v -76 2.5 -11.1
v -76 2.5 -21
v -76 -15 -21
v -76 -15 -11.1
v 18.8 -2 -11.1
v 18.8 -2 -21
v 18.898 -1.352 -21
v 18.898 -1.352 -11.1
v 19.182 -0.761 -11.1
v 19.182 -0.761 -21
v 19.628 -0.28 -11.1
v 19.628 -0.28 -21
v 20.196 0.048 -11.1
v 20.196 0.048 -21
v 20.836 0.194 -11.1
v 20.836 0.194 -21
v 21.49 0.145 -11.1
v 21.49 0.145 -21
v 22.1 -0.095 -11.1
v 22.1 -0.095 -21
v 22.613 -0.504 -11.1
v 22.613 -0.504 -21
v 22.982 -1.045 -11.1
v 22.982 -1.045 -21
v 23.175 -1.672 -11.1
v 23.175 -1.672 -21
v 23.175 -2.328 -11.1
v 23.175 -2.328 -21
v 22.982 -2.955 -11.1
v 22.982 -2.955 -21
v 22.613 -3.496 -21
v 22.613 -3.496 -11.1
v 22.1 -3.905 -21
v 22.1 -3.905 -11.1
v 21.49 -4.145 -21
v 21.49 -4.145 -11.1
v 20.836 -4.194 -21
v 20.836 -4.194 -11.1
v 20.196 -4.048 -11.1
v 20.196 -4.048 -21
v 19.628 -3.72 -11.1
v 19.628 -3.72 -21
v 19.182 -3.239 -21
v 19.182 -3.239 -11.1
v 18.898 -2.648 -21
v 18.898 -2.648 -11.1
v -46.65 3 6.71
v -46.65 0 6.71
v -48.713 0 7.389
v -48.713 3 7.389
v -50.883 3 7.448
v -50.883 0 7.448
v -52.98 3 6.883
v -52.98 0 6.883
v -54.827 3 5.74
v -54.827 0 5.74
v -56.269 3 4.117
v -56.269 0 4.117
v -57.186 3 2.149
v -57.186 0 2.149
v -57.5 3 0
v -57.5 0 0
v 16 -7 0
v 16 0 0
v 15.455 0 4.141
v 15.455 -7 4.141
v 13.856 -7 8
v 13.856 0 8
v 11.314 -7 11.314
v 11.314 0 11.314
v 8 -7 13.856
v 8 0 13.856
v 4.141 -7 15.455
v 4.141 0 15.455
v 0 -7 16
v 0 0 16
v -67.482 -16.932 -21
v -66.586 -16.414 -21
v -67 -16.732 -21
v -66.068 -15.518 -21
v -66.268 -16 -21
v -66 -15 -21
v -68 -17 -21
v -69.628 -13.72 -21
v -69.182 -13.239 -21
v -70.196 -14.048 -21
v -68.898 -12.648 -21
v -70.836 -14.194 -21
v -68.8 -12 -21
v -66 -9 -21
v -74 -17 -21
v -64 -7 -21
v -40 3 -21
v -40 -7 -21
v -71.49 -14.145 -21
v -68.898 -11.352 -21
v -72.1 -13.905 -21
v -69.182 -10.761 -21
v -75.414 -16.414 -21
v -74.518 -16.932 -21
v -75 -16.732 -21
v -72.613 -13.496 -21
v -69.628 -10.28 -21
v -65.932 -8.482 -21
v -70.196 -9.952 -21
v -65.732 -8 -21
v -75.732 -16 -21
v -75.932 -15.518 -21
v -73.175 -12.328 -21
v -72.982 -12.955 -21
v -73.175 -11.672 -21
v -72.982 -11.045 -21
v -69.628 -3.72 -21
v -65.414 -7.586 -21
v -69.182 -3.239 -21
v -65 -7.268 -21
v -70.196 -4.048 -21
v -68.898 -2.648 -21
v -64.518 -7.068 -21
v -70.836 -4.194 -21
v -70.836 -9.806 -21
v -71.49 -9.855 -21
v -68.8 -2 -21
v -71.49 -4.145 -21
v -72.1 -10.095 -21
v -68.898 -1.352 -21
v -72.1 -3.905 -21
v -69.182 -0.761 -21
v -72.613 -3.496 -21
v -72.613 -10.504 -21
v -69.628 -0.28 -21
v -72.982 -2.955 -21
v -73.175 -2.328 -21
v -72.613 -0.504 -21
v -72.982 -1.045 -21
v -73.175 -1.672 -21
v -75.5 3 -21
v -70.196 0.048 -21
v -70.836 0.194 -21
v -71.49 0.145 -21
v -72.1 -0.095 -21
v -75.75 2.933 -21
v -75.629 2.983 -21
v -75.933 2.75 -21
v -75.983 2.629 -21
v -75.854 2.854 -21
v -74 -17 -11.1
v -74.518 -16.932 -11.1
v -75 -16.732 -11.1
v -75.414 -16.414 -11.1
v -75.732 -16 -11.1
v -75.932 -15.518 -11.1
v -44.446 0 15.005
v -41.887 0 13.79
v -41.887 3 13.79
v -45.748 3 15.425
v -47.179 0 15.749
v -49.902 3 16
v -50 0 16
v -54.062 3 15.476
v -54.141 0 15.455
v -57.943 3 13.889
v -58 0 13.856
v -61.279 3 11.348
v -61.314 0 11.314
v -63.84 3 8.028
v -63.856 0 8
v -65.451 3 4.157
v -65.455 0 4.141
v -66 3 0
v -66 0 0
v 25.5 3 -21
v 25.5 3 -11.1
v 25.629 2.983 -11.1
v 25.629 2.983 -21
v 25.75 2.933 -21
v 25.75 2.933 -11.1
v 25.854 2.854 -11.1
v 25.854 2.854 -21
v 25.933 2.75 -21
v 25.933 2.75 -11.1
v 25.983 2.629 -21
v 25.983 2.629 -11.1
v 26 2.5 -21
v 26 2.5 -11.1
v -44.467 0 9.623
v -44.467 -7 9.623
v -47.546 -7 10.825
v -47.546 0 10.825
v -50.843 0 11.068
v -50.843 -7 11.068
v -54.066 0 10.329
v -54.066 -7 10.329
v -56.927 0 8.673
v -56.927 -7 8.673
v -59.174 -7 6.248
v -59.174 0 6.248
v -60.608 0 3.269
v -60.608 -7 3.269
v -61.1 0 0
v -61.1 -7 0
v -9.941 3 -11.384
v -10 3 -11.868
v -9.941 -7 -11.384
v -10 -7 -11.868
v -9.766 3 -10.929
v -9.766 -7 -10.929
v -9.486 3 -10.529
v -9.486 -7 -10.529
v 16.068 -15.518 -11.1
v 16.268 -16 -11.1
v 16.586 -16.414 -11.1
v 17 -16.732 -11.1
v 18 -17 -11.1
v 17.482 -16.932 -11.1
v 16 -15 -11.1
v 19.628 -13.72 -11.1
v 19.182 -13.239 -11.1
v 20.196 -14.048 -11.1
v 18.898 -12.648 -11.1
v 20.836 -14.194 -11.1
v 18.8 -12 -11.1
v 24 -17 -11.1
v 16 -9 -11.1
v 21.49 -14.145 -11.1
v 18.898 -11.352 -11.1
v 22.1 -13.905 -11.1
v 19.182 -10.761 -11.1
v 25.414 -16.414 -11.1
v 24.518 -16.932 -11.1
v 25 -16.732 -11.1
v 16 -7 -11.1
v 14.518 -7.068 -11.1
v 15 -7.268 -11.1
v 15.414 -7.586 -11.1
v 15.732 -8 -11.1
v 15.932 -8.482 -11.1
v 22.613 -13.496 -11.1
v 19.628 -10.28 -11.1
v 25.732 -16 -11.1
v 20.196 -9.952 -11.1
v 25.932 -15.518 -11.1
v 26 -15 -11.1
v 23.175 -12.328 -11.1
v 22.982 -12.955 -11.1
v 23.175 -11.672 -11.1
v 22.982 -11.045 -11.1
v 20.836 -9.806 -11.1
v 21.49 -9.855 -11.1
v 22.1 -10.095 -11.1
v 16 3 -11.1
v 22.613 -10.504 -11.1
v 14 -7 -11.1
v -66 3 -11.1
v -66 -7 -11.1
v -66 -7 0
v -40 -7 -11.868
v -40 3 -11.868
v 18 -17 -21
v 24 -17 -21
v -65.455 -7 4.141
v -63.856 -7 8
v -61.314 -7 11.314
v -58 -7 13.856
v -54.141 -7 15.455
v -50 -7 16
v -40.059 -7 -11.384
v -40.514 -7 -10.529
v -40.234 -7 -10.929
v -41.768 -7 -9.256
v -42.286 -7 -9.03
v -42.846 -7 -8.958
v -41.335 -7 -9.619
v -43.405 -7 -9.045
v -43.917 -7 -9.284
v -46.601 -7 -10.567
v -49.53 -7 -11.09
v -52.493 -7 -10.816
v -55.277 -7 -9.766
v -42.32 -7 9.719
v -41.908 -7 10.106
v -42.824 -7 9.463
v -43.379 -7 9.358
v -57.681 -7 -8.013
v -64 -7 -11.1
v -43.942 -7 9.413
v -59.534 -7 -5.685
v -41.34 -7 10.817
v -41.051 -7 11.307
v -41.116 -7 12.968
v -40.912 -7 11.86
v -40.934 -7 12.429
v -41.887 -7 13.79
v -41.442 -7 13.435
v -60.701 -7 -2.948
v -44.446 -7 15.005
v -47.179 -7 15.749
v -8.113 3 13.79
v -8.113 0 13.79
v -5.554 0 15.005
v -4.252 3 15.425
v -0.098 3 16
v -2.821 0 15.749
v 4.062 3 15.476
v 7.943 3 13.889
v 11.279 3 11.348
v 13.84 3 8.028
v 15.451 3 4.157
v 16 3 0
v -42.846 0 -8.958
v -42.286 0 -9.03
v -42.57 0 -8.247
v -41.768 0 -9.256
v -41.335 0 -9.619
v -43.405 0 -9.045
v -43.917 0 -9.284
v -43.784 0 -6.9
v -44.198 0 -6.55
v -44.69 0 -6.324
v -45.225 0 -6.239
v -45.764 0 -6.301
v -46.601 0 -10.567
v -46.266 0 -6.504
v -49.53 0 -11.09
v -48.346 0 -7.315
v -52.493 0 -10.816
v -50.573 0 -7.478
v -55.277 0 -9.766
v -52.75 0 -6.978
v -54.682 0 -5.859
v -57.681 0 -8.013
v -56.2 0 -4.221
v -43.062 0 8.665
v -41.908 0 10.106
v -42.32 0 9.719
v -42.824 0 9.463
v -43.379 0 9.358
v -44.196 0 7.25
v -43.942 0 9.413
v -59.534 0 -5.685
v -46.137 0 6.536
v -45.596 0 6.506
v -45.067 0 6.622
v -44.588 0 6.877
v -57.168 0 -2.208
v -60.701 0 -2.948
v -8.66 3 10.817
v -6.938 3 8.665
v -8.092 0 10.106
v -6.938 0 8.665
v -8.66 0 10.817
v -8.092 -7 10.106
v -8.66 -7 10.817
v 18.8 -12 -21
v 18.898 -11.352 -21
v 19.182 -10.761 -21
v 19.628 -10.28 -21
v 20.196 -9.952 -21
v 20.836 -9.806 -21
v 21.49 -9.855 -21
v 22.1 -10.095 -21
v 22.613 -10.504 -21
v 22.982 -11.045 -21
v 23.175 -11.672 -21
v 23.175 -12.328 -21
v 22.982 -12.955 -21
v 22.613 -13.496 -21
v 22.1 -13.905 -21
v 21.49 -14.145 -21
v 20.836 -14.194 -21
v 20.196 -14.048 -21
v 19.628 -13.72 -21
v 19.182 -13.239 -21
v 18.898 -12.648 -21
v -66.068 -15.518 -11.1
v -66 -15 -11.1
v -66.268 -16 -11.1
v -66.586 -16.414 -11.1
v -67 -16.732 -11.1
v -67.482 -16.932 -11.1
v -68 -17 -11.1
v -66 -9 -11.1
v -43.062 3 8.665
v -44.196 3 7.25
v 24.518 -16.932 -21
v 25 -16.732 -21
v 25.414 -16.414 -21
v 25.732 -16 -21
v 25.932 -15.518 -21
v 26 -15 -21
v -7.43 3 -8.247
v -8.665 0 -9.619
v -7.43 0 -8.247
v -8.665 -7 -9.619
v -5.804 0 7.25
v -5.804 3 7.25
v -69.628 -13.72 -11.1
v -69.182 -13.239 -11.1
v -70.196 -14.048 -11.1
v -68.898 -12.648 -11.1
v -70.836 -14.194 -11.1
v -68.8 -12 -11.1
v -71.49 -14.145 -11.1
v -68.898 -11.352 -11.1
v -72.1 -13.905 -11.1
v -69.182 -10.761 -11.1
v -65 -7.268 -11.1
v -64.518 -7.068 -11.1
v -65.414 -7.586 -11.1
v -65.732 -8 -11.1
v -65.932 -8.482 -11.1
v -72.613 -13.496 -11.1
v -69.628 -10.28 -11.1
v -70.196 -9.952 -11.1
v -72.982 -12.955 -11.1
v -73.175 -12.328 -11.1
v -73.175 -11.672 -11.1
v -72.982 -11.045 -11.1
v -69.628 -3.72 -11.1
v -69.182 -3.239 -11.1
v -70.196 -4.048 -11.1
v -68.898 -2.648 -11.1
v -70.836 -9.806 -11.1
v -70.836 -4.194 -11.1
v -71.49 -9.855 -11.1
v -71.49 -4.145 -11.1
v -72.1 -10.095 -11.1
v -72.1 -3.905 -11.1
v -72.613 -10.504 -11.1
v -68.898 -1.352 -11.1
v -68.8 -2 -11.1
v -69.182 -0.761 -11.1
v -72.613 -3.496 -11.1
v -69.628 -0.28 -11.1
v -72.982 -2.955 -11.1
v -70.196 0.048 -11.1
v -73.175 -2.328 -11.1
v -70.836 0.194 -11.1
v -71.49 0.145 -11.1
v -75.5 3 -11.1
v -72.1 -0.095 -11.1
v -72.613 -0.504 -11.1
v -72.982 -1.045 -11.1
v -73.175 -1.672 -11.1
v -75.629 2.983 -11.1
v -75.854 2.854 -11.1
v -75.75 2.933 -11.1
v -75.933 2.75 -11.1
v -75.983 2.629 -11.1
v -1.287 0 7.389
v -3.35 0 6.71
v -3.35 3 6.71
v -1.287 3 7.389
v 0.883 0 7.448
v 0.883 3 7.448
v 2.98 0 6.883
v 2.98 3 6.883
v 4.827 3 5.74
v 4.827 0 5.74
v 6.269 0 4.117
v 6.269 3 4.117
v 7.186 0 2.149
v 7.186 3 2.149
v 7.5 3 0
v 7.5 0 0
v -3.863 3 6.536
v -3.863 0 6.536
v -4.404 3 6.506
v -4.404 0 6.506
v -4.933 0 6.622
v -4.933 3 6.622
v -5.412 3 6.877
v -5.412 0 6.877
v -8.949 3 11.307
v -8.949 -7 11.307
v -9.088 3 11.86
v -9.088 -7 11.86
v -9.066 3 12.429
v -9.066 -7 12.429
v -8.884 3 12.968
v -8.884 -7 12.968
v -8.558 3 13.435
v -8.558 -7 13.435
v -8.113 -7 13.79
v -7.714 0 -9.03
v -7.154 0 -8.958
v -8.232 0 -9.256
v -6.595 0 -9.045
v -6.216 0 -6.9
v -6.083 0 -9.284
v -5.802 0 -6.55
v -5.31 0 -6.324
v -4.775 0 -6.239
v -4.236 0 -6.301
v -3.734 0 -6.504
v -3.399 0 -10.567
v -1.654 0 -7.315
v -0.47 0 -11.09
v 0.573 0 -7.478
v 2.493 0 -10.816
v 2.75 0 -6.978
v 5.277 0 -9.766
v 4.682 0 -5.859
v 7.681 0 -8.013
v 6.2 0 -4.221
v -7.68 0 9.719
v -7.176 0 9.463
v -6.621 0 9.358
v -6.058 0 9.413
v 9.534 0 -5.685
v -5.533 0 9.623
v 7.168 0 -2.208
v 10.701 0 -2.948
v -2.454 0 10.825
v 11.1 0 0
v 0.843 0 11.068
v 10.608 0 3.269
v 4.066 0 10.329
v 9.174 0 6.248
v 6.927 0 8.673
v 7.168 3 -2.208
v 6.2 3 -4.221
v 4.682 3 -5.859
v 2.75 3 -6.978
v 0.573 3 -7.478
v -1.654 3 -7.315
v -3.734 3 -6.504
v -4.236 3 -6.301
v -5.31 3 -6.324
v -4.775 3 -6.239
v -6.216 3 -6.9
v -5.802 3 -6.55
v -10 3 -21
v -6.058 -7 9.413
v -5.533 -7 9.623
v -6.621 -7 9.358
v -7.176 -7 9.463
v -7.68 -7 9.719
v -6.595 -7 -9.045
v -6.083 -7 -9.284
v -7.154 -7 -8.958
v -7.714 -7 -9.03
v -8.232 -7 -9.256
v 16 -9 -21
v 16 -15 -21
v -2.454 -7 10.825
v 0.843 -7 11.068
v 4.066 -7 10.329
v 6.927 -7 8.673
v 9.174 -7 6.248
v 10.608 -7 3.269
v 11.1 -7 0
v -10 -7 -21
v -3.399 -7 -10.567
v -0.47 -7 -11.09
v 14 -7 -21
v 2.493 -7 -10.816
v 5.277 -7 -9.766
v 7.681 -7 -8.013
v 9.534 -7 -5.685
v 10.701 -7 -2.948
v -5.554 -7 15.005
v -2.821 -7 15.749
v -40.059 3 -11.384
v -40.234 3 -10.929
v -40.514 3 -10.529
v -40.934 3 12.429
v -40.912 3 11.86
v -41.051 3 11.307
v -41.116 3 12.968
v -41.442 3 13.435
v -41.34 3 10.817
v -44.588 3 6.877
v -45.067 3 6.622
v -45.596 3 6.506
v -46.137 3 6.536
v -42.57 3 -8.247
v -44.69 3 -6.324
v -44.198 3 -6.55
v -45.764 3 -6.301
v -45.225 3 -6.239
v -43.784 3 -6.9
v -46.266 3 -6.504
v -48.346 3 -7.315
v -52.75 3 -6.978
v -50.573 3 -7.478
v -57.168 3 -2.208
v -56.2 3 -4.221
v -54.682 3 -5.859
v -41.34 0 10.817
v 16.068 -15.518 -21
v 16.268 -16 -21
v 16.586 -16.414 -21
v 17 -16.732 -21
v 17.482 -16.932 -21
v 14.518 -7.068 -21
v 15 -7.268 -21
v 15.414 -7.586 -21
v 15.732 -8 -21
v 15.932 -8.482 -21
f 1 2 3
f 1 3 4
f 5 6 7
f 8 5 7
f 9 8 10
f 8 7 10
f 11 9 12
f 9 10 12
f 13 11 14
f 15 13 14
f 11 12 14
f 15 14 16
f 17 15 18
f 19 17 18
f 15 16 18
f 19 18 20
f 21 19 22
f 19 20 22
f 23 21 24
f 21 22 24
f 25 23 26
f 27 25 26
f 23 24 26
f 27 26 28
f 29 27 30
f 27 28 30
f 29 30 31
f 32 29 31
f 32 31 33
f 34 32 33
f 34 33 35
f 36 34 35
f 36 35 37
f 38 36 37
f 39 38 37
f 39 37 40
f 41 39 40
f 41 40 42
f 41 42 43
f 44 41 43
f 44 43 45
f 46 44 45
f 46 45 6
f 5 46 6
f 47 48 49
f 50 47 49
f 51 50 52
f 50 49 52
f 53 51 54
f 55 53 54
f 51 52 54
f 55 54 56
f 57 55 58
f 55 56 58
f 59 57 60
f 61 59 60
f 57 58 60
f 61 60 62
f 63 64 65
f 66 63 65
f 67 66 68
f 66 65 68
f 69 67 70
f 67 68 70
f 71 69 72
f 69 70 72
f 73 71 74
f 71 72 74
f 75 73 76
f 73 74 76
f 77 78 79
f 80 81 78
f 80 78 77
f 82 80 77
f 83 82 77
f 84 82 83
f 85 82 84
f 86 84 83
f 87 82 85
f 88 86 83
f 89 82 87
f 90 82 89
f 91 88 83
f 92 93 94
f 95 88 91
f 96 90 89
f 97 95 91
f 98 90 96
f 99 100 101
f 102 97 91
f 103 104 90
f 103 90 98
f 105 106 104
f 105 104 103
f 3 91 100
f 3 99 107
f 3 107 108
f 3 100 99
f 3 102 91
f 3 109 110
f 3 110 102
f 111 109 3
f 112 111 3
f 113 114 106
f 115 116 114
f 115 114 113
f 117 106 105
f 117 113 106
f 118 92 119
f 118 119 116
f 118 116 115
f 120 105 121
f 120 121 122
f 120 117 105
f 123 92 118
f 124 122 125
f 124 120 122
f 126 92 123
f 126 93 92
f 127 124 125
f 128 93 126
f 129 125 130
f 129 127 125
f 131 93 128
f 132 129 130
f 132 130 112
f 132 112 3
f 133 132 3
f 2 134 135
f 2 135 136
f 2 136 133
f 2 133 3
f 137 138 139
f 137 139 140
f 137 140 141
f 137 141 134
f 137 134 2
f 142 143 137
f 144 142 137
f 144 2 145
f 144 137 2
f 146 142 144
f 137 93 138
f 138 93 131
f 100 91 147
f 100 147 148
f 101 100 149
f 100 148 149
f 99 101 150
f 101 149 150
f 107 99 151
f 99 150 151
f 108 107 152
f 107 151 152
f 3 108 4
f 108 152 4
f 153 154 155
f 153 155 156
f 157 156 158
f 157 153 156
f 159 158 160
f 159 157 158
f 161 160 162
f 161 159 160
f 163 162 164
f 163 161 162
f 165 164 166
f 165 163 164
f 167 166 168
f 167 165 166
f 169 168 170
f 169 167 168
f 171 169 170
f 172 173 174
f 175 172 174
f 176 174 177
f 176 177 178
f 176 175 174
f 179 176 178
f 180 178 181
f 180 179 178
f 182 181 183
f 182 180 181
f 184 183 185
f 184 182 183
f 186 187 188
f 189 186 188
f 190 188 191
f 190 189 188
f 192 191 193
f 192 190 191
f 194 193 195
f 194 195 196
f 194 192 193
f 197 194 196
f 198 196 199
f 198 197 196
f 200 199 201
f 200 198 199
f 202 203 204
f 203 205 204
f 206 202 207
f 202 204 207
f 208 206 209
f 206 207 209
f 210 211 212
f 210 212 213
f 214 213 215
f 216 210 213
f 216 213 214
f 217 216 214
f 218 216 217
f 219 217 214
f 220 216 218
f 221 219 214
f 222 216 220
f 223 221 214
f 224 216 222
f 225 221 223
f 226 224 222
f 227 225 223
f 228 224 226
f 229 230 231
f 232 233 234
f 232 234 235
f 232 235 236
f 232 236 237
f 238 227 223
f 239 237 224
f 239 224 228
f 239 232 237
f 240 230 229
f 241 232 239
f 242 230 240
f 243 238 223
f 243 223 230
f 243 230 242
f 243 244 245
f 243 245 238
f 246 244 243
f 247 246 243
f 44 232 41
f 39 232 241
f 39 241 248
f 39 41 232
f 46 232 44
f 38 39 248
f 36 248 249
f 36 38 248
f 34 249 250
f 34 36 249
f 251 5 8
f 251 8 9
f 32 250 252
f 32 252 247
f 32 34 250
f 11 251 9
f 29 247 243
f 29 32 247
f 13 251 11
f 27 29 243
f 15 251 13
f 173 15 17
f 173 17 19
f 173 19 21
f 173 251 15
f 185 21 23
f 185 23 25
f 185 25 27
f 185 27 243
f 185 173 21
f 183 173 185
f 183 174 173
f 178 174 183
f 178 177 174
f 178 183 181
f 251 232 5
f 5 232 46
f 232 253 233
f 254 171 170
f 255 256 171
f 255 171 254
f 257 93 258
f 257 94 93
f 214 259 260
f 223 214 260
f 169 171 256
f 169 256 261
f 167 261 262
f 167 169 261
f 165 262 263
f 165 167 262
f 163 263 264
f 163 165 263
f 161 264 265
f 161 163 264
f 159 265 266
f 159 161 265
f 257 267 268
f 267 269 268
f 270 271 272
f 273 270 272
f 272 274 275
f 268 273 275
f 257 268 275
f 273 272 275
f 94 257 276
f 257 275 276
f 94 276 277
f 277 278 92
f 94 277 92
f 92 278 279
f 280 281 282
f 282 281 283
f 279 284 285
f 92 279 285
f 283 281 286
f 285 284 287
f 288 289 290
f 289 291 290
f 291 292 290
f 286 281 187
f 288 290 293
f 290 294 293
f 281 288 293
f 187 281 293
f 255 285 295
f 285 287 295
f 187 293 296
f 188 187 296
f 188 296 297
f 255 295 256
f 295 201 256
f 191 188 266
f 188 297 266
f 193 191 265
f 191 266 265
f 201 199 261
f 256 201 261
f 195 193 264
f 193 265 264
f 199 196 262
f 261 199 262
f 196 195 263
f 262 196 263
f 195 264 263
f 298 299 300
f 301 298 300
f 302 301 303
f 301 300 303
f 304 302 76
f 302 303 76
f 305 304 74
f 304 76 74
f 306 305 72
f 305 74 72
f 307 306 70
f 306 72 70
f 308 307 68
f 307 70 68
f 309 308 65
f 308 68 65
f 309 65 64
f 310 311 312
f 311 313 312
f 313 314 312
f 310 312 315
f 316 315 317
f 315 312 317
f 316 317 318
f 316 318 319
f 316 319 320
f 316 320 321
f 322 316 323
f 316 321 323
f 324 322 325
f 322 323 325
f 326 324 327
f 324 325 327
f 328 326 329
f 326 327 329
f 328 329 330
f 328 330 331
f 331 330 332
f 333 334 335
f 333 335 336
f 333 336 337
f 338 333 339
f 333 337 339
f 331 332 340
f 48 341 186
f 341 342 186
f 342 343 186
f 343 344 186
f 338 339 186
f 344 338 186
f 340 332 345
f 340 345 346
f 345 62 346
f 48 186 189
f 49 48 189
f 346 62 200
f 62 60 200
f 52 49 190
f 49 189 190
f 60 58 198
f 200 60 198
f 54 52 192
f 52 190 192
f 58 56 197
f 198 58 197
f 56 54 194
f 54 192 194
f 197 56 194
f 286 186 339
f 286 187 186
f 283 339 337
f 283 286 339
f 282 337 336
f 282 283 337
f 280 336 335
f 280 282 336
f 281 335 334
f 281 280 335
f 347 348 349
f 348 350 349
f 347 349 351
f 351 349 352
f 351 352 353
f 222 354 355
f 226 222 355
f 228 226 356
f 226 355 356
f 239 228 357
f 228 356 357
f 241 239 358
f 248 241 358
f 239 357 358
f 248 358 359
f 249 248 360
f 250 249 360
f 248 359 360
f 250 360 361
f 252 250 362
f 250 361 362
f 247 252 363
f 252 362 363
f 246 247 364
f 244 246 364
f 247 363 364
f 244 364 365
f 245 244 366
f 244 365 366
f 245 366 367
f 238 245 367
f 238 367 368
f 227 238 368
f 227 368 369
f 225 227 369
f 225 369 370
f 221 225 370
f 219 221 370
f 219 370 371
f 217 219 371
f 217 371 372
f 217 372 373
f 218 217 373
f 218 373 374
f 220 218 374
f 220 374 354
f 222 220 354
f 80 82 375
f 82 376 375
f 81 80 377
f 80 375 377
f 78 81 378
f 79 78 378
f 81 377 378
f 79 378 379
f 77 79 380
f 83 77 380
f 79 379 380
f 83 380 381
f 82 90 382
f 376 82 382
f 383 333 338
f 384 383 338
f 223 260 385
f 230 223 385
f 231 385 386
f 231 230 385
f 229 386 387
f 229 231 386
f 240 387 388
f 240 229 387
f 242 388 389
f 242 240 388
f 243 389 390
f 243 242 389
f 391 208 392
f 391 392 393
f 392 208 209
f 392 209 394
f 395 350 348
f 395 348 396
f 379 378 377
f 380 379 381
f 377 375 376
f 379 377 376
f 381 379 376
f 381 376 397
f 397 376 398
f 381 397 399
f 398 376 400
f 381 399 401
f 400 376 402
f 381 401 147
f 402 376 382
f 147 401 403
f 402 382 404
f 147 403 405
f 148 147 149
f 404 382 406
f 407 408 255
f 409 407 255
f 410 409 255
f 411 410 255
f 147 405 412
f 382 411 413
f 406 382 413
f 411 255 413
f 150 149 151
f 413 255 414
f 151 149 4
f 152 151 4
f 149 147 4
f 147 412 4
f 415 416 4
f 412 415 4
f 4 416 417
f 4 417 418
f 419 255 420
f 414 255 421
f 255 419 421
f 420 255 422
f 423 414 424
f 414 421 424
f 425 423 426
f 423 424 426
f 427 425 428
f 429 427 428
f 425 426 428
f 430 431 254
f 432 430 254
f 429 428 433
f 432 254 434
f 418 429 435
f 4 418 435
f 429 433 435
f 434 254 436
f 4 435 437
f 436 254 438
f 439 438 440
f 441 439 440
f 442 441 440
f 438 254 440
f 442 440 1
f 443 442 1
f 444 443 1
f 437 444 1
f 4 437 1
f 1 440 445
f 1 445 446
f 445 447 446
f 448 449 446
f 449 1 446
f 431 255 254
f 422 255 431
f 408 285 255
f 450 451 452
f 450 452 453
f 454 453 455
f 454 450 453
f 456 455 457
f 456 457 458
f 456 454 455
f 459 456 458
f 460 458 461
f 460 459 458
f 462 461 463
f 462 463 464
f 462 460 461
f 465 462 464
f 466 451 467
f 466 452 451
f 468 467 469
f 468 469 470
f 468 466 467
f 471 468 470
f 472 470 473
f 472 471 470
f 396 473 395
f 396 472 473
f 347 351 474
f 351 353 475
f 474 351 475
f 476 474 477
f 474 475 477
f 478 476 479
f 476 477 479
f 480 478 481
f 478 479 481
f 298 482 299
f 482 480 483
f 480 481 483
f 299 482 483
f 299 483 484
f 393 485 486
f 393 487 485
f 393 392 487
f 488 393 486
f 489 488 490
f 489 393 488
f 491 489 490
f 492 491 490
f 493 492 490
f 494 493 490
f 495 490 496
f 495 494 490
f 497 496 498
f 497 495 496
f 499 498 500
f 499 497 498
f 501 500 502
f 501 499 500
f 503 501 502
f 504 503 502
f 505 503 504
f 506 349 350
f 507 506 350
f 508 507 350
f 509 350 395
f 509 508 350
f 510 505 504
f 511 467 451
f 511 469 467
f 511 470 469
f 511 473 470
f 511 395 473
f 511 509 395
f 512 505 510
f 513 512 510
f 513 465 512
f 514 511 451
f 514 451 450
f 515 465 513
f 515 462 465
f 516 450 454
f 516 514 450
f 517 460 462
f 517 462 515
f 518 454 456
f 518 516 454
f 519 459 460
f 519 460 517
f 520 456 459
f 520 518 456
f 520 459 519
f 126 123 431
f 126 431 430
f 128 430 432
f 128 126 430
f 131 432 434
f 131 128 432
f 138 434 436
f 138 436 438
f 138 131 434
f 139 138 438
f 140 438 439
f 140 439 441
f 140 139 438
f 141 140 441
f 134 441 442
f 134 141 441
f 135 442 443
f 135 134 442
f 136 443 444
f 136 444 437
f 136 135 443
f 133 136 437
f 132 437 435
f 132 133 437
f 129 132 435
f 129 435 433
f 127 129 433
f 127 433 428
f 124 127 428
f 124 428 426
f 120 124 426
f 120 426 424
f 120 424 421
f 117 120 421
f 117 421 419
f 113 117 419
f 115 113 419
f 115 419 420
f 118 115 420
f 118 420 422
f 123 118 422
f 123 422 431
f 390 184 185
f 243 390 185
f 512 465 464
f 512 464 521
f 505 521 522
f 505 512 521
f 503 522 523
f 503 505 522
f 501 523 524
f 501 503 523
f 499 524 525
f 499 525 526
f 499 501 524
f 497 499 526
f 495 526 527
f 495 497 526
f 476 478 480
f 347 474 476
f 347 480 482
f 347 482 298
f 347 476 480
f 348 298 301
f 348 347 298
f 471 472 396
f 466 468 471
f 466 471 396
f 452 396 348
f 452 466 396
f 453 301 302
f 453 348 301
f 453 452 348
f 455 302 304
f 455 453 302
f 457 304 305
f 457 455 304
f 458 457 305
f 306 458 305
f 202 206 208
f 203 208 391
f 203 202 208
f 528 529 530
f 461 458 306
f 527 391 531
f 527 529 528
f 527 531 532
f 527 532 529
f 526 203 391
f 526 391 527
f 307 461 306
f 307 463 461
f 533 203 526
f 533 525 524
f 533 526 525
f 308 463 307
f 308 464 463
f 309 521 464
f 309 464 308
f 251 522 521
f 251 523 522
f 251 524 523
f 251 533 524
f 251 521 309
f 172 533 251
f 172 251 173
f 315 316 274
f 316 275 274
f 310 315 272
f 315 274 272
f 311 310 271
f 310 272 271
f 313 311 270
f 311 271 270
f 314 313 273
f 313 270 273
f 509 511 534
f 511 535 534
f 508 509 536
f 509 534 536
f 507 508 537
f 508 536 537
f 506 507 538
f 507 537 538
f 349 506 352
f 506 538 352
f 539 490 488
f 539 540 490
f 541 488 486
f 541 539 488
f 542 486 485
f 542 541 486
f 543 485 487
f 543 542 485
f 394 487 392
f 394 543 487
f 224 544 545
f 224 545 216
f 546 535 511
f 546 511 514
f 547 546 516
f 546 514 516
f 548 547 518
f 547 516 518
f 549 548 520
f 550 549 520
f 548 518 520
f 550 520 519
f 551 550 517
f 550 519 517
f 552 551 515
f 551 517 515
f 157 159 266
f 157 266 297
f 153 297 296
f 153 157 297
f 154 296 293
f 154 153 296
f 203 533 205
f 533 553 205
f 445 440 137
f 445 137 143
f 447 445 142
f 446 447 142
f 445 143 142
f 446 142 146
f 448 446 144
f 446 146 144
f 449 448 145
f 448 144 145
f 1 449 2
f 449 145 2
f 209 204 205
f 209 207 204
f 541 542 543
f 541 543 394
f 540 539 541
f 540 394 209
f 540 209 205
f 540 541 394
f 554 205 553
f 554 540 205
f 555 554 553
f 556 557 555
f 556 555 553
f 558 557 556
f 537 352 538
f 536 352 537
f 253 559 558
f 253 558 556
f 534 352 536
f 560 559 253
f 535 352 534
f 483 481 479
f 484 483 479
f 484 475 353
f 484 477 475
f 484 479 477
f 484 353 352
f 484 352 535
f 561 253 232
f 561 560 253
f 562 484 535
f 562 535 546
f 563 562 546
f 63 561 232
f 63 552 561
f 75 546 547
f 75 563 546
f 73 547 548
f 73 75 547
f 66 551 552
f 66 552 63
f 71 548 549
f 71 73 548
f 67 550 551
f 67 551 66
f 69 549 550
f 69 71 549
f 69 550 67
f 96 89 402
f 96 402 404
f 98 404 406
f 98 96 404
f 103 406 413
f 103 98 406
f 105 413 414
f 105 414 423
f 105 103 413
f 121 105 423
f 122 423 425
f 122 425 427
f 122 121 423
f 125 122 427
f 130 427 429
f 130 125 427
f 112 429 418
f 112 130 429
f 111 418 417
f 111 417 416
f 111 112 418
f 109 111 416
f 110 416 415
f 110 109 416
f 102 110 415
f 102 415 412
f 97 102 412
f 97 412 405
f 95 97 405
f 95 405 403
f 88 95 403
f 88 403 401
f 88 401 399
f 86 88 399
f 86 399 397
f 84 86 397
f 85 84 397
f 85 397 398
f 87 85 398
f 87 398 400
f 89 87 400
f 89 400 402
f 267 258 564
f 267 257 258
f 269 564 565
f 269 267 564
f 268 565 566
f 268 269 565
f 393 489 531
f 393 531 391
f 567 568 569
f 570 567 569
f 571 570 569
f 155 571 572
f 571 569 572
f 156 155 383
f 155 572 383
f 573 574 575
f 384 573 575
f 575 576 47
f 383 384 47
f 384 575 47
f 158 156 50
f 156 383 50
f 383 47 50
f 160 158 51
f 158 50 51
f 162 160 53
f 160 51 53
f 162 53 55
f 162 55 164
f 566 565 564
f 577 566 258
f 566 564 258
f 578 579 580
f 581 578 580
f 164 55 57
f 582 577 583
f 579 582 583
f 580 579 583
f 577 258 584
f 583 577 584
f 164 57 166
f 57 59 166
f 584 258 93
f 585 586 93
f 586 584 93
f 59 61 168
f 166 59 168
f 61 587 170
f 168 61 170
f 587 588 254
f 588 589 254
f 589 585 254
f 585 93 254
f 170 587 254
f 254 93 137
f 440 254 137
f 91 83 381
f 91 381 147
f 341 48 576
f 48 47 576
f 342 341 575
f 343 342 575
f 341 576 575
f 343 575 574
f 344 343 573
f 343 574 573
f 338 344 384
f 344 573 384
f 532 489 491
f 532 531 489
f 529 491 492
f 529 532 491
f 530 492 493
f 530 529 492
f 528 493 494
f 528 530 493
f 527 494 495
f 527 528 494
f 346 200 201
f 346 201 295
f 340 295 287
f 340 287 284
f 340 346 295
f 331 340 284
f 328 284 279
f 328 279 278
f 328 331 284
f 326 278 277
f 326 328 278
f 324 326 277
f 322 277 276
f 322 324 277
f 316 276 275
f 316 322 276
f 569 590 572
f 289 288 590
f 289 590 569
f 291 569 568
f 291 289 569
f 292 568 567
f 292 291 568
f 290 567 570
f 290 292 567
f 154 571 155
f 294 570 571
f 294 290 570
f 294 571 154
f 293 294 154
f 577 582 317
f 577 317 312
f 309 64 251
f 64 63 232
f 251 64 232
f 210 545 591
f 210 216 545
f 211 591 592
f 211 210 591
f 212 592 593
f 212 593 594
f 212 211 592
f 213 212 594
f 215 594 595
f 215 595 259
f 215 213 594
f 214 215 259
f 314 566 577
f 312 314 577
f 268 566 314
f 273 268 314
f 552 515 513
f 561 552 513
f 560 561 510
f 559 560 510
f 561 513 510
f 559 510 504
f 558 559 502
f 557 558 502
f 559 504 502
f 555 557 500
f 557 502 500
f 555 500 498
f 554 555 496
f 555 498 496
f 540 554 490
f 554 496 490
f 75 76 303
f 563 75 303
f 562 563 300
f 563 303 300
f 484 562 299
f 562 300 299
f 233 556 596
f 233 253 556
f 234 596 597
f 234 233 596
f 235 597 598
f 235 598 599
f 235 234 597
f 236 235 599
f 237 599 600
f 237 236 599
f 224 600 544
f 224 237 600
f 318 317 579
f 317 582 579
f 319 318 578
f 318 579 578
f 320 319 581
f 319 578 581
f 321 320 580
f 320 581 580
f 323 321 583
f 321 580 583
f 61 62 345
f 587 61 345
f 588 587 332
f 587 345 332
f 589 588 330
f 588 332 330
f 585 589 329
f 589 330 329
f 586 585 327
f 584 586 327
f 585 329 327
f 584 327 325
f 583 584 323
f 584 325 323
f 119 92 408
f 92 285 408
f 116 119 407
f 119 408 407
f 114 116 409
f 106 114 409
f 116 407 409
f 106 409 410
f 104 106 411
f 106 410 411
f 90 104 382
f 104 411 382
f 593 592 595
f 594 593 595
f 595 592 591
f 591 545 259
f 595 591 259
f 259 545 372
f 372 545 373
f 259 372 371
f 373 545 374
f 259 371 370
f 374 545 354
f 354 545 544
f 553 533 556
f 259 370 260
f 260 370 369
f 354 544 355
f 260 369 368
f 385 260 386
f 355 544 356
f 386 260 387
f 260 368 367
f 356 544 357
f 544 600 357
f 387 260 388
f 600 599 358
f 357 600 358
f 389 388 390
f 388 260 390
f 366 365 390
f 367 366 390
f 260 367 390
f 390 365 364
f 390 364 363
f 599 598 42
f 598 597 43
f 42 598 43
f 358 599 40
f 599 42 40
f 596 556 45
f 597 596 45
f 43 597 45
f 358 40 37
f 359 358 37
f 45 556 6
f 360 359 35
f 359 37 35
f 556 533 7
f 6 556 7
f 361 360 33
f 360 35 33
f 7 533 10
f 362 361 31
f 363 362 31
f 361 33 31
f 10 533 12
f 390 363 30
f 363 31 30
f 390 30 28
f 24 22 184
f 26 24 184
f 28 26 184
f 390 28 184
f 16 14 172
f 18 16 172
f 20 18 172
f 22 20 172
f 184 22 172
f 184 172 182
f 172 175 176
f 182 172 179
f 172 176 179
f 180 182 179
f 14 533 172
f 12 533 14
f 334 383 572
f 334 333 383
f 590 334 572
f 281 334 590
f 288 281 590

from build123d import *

# Parameters (mm, degrees)
F1_DEPTH = 7
F2_DEPTH = 3
F3_W     = 10
F3_H     = 9.9
F4_DEPTH = 10
F6_D     = 4.4
F7_R     = 2
F8_R     = 2
F9_R     = 0.5


# Not quite as in the source:
# - a feature names something its author has since deleted; it is built from what else it names


with BuildPart() as f1:
    # F0 (on Front) → F1 (new body)
    with BuildSketch(Plane.XZ):
        with BuildLine():
            ThreePointArc((-10, -12.4899959968), (1.031140389, -15.9667388498), (11.5234543432, -11.1))
            Line((11.5234543432, -11.1), (0, -11.1))
            Line((0, -11.1), (-10, -11.1))
            Line((-10, -11.1), (-10, -12.4899959968))
        make_face()
        with BuildLine():
            Line((26, -21), (26, -11.1))
            Line((26, -11.1), (16, -11.1))
            Line((16, -11.1), (11.5234543432, -11.1))
            ThreePointArc((11.5234543432, -11.1), (1.031140389, -15.9667388498), (-10, -12.4899959968))
            Line((-10, -12.4899959968), (-10, -21))
            Line((-10, -21), (26, -21))
        make_face()
        with BuildLine():
            Line((16, -11.1), (16, 0))
            ThreePointArc((16, 0), (14.8387207921, -5.9843433436), (11.5234543432, -11.1))
            Line((11.5234543432, -11.1), (16, -11.1))
        make_face()
        with BuildLine():
            ThreePointArc((16, 0), (11.313708499, 11.313708499), (0, 16))
            ThreePointArc((0, 16), (-5.2990595416, 15.0970185128), (-10, 12.4899959968))
            Line((-10, 12.4899959968), (-6.9375, 8.6649347228))
            ThreePointArc((-6.9375, 8.6649347228), (4.806440991, 10.0054047894), (11.1, 0))
            ThreePointArc((11.1, 0), (7.8488852712, -7.8488852712), (0, -11.1))
            Line((0, -11.1), (11.5234543432, -11.1))
            ThreePointArc((11.5234543432, -11.1), (14.8387207921, -5.9843433436), (16, 0))
        make_face()
        with BuildLine():
            Line((-7.4296123602, -8.2468697199), (-10, -11.1))
            Line((-10, -11.1), (0, -11.1))
            ThreePointArc((0, -11.1), (-3.9793055996, -10.3621970134), (-7.4296123602, -8.2468697199))
        make_face()
    extrude(amount=F1_DEPTH)

    # F1_face (on face) + F0 (on Front) → F2 (join)
    with BuildSketch(Plane(origin=(7.471830613, 0, -8.1748565064), x_dir=(1, 0, 0), z_dir=(0, 1, 0))):
        with BuildLine():
            Line((-17.471830613, 2.9251434936), (-14.9014429732, 0.0720132135))
            ThreePointArc((-14.9014429732, 0.0720132135), (3.6234729777, -7.8519970471), (-14.409330613, -16.8397912292))
            Line((-14.409330613, -16.8397912292), (-17.471830613, -20.6648525032))
            ThreePointArc((-17.471830613, -20.6648525032), (-0.5436273827, -22.5970616082), (8.528169387, -8.1748565064))
            Line((8.528169387, -8.1748565064), (8.528169387, 2.9251434936))
            Line((8.528169387, 2.9251434936), (18.528169387, 2.9251434936))
            Line((18.528169387, 2.9251434936), (18.528169387, 12.8251434936))
            Line((18.528169387, 12.8251434936), (-17.471830613, 12.8251434936))
            Line((-17.471830613, 12.8251434936), (-17.471830613, 2.9251434936))
        make_face()
    with BuildSketch(Plane.XZ):
        with BuildLine():
            ThreePointArc((11.1, 0), (4.806440991, 10.0054047894), (-6.9375, 8.6649347228))
            Line((-6.9375, 8.6649347228), (-4.6875, 5.8546856235))
            ThreePointArc((-4.6875, 5.8546856235), (3.2475952642, 6.7604086415), (7.5, 0))
            ThreePointArc((7.5, 0), (3.0495850016, -6.8520092906), (-5.0200083515, -5.5722092702))
            Line((-5.0200083515, -5.5722092702), (-7.4296123602, -8.2468697199))
            ThreePointArc((-7.4296123602, -8.2468697199), (-3.9793055996, -10.3621970134), (0, -11.1))
            ThreePointArc((0, -11.1), (7.8488852712, -7.8488852712), (11.1, 0))
        make_face()
    extrude(amount=F2_DEPTH, dir=(0, 1, 0))

    # F3 (on face) → F4 (join)
    with BuildSketch(Plane.XZ.offset(7)):
        with Locations((21, -16.05)):
            Rectangle(F3_W, F3_H)
    extrude(amount=F4_DEPTH)

    # F6 (through all)
    with Locations(Plane.XY.offset(-11.1)):
        with Locations((21, -2), (21, -12)):
            Hole(F6_D / 2)

    # F7
    f7_edges = [f1.edges().sort_by_distance(p)[0] for p in [
        (-10, -2, 12.489996),
        (-4.6875, 1.5, 5.854686),
        (-5.020008, 1.5, -5.572209),
        (-7.429612, -3.5, -8.24687),
        (-6.9375, -3.5, 8.664935),
        (-10, -2, -11.1),
    ]]
    fillet(f7_edges, radius=F7_R)

    # F8
    f8_edges = [f1.edges().sort_by_distance(p)[0] for p in [
        (16, -17, -16.05),
        (16, -7, -16.05),
        (26, -17, -16.05),
    ]]
    fillet(f8_edges, radius=F8_R)

    # F9
    f9_edges = [f1.edges().sort_by_distance(p)[0] for p in [
        (26, 3, -16.05),
    ]]
    fillet(f9_edges, radius=F9_R)


with BuildPart() as f11_1:
    # F11: instance of F1
    add(f1.part.mirror(Plane.YZ.offset(-25)))


solid = Compound([f1.part, f11_1.part])
